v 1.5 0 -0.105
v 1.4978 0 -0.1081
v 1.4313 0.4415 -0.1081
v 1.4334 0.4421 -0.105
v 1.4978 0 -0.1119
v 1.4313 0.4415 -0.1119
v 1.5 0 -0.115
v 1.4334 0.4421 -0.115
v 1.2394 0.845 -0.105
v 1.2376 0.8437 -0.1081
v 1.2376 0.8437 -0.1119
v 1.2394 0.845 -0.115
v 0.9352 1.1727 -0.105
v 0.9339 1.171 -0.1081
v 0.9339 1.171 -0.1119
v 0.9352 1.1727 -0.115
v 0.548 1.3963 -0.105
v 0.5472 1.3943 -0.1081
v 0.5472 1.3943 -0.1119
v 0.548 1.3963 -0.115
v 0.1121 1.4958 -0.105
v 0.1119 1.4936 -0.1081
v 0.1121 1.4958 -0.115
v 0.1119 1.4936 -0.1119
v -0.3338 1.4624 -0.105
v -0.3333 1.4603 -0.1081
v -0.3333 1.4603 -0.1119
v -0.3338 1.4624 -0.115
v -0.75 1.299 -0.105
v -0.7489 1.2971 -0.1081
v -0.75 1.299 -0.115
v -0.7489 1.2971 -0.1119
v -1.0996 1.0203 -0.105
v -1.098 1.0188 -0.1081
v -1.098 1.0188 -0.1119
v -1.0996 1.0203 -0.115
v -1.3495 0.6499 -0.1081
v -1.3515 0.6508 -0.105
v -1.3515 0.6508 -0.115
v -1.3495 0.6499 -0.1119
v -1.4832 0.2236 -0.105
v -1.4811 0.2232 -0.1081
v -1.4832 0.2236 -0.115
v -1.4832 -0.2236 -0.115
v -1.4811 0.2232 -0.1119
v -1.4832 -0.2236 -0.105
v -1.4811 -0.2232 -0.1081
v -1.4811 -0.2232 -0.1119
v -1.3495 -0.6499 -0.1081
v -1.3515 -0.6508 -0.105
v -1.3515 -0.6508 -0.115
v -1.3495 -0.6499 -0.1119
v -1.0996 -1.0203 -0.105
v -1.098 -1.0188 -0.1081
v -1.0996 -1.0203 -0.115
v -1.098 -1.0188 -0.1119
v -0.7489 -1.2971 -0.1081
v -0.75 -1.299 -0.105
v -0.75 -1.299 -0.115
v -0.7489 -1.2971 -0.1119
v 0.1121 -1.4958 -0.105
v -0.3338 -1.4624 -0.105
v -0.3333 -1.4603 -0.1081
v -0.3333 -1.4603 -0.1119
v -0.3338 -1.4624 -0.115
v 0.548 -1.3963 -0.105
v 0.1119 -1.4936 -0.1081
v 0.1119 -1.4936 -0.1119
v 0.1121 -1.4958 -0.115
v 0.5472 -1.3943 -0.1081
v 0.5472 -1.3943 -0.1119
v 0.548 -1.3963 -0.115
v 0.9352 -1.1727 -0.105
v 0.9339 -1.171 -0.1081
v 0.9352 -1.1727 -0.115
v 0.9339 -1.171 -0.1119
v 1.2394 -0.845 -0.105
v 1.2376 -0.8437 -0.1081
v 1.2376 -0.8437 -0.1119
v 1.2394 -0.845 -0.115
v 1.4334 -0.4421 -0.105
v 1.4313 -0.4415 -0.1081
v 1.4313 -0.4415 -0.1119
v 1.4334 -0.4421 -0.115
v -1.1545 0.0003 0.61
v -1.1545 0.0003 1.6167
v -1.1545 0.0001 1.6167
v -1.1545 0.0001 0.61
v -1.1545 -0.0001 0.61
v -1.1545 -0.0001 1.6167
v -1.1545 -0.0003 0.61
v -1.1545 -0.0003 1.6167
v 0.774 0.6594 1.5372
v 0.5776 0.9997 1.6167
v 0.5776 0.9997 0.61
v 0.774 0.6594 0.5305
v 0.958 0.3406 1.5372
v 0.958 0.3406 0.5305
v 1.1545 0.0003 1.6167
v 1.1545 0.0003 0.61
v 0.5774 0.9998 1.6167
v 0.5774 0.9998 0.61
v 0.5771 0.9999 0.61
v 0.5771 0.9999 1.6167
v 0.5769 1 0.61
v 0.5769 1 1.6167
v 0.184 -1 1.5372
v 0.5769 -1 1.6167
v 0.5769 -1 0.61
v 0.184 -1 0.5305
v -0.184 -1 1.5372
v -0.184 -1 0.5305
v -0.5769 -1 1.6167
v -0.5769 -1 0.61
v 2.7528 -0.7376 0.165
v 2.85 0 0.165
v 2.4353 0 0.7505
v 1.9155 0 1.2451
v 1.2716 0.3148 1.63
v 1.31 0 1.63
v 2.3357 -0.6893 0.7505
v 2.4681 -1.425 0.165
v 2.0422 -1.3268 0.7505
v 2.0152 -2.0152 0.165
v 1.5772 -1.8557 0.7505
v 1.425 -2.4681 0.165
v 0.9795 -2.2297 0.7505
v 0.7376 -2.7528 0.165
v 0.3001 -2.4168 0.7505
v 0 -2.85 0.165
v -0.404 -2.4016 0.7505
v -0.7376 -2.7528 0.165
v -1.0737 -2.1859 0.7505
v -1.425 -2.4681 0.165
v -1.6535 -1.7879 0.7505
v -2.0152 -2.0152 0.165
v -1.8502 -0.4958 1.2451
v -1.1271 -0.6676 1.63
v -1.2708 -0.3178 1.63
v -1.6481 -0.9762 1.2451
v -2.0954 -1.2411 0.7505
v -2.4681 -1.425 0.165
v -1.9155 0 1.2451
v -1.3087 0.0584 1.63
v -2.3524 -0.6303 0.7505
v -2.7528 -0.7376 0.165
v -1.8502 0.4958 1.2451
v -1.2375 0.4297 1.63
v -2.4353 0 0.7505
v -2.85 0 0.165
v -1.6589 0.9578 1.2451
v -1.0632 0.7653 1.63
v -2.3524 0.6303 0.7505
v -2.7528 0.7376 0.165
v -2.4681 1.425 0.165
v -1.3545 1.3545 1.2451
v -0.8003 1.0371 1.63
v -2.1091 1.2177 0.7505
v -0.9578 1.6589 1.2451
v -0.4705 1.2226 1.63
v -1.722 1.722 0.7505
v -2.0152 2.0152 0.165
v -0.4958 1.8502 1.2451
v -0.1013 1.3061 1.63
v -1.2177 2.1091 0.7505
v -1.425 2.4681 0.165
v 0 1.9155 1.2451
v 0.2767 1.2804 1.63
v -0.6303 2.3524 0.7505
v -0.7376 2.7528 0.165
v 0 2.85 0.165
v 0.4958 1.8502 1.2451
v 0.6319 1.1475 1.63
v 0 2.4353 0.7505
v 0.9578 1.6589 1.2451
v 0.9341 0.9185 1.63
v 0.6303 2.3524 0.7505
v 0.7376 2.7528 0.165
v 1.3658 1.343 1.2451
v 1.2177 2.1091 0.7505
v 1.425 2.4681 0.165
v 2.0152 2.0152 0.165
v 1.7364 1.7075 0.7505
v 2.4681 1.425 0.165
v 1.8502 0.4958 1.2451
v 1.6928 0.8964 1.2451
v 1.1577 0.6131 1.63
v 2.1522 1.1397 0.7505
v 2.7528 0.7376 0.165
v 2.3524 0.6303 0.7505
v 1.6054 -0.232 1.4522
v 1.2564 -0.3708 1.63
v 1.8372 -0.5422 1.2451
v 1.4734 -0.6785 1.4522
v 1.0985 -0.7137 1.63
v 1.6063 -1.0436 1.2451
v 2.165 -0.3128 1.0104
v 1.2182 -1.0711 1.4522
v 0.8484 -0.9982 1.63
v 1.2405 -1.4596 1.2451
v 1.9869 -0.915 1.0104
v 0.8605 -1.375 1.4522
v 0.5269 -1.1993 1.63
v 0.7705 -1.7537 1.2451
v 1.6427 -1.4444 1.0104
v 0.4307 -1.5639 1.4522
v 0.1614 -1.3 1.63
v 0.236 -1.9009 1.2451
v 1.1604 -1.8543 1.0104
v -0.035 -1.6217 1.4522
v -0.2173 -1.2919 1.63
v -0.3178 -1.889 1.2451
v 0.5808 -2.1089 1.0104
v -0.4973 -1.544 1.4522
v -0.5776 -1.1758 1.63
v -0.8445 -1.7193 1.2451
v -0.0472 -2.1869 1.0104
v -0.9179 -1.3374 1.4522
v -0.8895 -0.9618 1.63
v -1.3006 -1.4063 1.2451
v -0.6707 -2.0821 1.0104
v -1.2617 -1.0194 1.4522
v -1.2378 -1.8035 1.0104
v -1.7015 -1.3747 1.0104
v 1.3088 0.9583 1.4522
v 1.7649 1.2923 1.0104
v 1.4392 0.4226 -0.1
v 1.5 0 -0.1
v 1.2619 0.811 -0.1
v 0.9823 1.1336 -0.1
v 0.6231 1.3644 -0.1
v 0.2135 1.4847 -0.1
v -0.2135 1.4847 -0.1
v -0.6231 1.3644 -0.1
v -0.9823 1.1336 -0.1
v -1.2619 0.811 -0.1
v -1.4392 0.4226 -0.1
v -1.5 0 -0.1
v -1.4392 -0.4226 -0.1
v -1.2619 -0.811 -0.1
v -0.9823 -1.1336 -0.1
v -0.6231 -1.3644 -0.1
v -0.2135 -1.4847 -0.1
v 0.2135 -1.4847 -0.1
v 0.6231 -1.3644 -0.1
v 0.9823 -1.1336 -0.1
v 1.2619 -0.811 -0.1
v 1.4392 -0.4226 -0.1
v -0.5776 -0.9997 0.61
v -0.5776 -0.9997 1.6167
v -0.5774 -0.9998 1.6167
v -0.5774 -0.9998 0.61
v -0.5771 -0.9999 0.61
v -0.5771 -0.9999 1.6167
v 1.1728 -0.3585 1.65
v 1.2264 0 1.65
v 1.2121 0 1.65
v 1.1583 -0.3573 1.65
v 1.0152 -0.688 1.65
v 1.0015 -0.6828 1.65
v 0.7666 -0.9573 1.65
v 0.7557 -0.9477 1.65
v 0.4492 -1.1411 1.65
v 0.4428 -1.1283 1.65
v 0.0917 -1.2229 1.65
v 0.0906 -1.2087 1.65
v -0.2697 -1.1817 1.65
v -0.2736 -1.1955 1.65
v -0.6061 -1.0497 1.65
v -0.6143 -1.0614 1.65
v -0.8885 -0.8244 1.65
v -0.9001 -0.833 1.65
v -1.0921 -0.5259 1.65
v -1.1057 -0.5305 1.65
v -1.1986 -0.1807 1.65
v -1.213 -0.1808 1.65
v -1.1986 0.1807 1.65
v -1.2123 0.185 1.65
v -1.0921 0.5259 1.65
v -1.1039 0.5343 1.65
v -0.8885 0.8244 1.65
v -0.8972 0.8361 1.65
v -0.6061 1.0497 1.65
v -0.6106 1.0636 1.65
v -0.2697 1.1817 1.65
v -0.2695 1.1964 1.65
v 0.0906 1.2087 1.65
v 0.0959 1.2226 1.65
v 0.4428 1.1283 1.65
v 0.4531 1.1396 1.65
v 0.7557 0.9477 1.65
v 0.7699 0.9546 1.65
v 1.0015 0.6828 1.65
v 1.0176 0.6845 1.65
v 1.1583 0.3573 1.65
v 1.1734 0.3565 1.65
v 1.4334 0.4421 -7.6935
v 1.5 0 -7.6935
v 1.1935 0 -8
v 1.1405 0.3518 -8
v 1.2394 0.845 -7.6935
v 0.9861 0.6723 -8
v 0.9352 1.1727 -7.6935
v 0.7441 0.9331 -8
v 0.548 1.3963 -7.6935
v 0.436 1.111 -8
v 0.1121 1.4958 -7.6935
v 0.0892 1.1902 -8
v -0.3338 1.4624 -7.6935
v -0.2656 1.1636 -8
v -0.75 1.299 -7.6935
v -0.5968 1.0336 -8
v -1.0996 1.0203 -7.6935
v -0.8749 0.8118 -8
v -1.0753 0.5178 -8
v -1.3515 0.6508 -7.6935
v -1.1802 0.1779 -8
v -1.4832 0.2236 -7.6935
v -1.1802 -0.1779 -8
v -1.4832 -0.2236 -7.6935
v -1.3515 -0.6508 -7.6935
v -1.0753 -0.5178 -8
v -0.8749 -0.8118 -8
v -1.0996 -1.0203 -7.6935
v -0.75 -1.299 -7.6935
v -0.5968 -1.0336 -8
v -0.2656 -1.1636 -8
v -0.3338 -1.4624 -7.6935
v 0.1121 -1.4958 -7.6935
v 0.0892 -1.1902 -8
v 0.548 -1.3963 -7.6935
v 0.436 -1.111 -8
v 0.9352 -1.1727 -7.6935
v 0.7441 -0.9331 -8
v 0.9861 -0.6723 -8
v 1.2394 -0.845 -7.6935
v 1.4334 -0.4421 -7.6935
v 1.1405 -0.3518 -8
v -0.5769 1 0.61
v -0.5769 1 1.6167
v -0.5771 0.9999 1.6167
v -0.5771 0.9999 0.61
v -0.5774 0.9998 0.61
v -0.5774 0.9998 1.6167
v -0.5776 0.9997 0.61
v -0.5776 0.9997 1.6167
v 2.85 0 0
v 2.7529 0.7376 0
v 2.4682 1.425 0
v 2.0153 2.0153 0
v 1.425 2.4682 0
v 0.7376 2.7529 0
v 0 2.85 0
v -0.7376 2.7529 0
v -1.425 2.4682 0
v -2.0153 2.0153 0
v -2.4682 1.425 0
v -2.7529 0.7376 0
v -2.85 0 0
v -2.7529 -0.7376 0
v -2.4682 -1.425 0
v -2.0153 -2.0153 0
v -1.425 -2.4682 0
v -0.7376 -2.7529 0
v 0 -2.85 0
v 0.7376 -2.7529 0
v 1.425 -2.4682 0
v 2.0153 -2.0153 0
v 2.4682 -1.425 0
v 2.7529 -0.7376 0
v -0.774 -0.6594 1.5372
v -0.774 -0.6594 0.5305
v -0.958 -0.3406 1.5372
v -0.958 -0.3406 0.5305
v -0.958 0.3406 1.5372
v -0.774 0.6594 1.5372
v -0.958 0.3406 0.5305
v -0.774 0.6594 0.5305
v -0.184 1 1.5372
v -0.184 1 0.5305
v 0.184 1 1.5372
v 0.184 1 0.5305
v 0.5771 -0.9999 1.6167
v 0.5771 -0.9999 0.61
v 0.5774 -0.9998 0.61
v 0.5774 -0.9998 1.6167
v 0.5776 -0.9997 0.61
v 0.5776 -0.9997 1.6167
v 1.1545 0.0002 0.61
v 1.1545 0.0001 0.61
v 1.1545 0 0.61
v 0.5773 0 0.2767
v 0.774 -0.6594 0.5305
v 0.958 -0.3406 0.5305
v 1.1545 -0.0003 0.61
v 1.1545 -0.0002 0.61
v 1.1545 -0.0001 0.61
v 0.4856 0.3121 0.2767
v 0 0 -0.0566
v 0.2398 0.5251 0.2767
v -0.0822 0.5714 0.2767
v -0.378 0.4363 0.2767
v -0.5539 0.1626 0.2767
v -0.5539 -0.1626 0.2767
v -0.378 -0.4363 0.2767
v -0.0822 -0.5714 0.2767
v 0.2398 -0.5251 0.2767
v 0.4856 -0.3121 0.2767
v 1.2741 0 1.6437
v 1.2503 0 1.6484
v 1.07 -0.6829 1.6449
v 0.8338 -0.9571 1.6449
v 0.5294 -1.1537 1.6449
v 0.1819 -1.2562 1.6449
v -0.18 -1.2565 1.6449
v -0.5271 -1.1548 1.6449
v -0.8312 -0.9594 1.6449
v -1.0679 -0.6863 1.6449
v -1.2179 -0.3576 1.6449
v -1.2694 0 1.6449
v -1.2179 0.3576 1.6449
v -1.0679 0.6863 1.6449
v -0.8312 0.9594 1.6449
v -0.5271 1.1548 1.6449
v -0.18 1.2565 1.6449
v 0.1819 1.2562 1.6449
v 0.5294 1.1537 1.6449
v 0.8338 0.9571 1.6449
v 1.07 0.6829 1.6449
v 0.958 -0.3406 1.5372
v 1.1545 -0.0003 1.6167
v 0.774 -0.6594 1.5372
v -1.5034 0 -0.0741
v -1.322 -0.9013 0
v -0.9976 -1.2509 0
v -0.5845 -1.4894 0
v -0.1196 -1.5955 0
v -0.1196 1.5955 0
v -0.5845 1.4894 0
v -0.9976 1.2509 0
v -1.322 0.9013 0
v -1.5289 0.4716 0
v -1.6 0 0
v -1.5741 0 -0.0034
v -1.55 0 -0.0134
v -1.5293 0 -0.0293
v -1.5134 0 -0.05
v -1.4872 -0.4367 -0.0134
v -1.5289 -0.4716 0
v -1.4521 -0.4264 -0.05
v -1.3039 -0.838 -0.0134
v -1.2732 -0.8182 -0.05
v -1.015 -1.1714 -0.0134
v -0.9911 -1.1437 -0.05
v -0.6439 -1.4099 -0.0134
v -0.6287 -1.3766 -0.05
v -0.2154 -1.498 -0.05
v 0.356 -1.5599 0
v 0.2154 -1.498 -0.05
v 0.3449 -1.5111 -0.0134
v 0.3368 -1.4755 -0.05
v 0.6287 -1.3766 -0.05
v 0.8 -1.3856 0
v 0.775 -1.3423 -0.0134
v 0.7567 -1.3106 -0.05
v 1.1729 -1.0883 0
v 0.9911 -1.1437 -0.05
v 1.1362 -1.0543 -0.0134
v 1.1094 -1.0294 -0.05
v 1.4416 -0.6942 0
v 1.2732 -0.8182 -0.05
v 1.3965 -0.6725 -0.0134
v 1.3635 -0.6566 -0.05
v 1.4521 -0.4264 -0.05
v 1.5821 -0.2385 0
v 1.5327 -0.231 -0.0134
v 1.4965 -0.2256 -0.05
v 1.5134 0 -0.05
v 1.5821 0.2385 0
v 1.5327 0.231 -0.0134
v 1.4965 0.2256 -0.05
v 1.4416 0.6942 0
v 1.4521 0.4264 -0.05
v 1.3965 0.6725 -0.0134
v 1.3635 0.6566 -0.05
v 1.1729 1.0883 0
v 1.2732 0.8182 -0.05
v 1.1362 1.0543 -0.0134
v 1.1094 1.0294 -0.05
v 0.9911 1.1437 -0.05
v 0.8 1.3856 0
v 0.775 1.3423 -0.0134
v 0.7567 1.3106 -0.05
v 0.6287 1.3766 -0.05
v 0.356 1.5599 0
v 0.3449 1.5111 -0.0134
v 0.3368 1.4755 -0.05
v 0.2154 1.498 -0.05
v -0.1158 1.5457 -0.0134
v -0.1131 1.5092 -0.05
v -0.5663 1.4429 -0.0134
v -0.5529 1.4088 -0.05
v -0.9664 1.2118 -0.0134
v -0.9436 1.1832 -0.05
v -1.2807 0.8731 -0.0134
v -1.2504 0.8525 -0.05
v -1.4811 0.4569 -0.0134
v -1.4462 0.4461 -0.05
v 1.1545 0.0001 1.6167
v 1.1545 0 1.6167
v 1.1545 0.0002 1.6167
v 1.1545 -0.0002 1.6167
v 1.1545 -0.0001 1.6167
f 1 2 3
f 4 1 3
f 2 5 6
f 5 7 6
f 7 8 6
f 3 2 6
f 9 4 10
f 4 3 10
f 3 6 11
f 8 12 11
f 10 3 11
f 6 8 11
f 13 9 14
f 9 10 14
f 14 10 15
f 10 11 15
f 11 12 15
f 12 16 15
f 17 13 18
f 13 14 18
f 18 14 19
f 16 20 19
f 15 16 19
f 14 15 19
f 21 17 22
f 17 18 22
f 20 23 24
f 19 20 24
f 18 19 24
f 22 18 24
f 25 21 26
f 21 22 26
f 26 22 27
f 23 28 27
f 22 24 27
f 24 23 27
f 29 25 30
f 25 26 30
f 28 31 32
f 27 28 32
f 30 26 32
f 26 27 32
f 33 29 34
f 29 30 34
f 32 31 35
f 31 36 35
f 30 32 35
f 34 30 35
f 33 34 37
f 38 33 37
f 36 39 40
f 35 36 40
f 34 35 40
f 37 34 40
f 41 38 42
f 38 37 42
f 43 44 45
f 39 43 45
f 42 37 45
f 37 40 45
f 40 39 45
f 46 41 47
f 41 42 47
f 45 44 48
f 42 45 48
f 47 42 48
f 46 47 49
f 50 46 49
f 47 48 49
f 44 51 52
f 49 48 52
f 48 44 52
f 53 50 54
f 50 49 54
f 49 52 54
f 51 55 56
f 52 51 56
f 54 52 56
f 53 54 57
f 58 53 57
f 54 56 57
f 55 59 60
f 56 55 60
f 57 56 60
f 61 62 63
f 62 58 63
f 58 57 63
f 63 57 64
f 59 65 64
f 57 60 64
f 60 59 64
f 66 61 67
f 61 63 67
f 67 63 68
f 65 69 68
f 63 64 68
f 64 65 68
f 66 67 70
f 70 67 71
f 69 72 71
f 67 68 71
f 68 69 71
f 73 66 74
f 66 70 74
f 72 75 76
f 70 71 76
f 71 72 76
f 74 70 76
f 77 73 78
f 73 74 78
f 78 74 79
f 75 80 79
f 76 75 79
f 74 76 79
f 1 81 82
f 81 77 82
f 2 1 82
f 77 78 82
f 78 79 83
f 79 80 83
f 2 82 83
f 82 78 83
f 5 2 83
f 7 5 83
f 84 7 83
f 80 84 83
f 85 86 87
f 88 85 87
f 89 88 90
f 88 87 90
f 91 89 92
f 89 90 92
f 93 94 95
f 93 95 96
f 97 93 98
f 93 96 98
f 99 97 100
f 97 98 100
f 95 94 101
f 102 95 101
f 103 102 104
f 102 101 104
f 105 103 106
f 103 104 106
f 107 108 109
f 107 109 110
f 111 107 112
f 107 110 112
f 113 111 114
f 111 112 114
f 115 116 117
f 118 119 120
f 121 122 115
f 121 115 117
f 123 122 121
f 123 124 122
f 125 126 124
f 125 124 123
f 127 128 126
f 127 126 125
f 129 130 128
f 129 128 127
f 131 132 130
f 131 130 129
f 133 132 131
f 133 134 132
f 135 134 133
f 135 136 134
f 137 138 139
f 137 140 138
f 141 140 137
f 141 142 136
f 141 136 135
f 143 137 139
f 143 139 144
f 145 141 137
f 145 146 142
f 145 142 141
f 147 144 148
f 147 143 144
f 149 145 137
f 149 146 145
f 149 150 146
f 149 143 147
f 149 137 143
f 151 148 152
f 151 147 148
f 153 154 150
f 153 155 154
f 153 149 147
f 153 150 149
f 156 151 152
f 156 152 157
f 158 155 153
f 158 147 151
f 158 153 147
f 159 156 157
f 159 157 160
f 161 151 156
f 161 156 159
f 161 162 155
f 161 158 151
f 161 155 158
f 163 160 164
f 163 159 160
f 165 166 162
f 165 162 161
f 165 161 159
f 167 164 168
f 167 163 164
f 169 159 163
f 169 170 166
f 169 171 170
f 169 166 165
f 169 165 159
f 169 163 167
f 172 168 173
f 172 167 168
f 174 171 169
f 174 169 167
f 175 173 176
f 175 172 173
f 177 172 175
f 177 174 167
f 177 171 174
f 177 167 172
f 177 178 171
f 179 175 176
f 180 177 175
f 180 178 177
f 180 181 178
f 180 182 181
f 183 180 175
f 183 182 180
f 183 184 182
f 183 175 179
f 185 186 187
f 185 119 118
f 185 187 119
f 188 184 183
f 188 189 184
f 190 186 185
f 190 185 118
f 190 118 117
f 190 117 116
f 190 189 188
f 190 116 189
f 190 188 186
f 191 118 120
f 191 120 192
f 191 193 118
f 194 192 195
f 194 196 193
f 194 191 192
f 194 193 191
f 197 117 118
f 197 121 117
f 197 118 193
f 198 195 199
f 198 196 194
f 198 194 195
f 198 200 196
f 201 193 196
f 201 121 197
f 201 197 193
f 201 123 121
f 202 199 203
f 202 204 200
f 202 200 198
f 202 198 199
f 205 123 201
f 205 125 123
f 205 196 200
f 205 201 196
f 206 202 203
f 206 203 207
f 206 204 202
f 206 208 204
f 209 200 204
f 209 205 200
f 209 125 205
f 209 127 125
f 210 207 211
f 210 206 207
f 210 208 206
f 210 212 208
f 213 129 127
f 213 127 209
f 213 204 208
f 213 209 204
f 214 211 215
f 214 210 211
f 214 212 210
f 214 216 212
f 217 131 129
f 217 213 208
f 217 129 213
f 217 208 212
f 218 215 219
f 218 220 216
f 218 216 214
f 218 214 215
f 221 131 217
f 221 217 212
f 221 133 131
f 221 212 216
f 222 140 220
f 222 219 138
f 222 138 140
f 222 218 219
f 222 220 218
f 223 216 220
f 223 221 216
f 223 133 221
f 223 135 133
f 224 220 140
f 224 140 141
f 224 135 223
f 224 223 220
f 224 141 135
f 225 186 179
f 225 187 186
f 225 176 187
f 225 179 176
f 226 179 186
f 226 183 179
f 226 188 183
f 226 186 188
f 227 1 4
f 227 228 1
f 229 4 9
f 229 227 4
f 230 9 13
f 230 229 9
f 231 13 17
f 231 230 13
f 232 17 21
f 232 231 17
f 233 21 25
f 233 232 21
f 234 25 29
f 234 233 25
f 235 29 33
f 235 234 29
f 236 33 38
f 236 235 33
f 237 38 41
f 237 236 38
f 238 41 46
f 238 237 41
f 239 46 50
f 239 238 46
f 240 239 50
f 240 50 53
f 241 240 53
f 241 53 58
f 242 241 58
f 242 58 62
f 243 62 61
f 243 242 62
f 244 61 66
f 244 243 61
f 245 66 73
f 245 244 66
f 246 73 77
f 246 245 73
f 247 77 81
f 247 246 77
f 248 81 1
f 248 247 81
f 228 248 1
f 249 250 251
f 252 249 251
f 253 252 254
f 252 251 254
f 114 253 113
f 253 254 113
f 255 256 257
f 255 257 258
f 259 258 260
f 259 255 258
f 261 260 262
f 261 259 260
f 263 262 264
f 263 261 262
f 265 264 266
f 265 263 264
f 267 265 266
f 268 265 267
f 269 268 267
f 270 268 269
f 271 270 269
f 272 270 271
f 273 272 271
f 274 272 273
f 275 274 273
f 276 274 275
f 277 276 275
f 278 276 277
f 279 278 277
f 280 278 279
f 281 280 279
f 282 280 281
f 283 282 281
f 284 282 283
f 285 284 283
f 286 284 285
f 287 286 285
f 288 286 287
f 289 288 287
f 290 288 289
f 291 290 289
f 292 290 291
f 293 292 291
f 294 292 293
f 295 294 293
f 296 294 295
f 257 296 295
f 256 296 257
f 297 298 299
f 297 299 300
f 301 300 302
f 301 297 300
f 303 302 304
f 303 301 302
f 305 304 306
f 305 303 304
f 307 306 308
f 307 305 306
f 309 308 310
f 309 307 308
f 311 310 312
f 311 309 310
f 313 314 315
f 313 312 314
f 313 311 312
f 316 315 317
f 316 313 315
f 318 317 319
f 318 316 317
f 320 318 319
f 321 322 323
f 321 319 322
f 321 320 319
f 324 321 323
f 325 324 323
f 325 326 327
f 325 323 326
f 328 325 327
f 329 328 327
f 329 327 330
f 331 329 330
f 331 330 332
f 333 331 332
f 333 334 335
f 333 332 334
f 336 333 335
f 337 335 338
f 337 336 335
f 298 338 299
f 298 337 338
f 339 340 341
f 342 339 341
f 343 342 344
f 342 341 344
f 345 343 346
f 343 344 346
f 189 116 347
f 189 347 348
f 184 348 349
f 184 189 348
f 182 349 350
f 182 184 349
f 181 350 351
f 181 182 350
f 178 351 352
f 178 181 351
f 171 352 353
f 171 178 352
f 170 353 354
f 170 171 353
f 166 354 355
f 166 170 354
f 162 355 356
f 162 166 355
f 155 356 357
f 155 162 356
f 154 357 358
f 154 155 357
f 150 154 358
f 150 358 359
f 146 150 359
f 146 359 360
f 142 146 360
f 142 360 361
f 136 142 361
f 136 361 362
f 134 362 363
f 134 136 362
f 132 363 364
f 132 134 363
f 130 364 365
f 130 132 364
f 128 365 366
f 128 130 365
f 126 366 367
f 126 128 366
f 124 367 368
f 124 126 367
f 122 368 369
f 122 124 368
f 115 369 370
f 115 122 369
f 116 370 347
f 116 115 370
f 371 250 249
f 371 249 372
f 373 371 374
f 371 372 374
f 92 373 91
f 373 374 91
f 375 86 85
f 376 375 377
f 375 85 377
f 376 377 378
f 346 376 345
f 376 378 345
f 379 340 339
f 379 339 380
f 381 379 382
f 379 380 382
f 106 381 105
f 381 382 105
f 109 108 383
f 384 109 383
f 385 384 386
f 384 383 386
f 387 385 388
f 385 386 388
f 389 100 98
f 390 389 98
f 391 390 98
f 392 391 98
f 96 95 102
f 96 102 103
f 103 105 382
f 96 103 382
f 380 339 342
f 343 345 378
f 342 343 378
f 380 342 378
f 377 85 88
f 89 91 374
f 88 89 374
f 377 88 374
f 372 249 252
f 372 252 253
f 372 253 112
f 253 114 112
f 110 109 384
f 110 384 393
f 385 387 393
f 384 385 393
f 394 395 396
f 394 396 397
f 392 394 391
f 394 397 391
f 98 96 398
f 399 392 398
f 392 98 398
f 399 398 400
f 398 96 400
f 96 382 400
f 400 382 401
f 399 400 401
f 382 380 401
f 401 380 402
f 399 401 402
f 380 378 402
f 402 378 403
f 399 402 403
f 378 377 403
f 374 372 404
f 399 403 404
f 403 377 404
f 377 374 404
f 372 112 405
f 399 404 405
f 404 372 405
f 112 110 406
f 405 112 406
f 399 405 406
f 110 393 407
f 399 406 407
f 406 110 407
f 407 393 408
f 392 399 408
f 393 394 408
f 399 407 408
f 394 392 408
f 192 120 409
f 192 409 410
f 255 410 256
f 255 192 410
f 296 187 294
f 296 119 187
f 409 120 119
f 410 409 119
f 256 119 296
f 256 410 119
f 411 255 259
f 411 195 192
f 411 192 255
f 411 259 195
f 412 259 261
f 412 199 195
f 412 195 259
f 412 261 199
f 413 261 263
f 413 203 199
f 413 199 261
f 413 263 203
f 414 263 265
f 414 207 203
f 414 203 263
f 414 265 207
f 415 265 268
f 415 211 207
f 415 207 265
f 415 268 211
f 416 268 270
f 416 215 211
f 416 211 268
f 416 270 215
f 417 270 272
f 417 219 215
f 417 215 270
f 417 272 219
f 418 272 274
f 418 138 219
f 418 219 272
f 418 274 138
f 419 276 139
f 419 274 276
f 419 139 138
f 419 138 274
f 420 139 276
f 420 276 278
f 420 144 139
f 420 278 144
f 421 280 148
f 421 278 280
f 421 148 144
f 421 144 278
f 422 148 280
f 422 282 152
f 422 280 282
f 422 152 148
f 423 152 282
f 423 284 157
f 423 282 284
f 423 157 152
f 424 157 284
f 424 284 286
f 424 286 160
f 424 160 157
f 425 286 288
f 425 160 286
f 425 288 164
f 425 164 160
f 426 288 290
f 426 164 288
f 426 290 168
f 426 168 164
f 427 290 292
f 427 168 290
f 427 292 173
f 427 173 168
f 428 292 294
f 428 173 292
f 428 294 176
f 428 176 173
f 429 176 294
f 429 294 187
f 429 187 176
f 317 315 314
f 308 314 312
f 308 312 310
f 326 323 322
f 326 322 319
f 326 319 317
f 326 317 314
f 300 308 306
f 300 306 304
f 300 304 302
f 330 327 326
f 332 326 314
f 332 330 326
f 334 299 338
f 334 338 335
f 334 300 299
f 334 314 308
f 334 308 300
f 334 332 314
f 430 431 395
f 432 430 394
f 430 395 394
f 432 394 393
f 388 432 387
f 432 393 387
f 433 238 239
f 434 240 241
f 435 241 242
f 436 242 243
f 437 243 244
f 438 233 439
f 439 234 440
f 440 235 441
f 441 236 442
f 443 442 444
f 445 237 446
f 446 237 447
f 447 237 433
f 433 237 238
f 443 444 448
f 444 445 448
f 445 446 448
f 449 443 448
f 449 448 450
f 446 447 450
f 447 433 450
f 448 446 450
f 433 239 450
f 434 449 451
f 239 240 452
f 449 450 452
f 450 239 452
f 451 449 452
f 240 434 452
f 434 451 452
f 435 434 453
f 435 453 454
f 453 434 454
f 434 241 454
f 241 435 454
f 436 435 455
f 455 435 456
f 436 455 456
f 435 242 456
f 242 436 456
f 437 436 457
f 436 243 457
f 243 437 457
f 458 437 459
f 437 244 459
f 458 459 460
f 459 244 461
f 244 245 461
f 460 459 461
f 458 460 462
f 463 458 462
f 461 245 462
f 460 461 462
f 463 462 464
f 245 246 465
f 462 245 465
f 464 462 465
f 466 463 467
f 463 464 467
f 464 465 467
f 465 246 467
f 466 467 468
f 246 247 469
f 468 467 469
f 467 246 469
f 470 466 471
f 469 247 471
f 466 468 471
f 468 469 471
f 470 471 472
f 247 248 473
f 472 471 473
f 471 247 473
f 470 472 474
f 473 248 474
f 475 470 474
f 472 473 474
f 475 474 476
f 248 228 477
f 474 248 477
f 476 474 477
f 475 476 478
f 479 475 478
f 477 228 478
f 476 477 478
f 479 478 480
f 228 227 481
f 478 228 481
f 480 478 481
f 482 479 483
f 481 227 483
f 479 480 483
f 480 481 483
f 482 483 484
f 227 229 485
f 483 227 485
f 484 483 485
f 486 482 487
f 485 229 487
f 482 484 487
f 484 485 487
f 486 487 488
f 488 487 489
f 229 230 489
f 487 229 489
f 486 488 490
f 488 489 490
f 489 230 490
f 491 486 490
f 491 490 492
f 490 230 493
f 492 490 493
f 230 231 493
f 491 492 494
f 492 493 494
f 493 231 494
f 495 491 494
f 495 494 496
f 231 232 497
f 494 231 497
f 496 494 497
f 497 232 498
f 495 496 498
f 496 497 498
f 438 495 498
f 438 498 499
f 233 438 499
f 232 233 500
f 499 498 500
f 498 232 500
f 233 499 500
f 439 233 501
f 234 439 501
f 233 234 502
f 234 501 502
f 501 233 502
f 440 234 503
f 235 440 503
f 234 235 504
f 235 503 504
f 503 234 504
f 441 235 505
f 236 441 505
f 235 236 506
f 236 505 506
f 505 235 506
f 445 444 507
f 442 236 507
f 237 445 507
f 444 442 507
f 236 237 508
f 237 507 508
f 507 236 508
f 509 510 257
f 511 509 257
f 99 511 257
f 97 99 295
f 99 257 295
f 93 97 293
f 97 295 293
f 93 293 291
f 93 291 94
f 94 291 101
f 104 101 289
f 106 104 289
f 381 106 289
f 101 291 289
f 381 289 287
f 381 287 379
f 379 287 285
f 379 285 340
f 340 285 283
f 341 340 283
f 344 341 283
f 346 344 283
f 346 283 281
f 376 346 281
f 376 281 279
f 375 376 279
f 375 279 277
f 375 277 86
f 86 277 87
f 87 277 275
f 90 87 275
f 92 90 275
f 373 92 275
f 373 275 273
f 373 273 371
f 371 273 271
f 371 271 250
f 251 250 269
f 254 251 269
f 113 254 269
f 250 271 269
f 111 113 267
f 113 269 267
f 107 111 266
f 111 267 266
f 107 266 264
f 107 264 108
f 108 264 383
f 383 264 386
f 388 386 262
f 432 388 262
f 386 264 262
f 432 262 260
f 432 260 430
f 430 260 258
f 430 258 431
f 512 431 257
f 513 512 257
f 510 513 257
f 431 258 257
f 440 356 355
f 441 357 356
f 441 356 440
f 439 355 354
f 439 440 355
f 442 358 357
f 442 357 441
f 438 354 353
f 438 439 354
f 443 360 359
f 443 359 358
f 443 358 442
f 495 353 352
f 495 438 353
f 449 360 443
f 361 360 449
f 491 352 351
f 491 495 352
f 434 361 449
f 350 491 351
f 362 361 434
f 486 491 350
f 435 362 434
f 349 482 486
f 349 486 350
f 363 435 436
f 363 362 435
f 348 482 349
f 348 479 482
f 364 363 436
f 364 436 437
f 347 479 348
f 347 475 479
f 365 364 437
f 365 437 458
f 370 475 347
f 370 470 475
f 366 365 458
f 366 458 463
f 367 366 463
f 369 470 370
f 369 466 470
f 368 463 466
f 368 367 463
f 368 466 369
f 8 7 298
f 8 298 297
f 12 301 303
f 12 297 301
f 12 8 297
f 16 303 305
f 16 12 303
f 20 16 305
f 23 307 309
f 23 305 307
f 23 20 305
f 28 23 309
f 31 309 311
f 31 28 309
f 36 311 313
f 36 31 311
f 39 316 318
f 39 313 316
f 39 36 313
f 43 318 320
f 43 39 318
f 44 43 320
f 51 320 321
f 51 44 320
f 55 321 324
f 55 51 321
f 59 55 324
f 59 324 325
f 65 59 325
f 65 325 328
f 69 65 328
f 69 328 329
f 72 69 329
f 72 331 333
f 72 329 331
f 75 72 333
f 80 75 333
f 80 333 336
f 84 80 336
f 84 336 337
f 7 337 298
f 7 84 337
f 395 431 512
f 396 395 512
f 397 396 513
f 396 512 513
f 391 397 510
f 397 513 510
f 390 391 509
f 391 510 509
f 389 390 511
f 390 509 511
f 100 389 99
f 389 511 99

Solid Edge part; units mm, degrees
sketch "Sketch1" plane through (0, 0, 0) normal (0, -1, 0) x (1, 0, 0)
  line L0 (0, -8) -> (1.5, -8)
  line L1 (1.5, -8) -> (1.5, -0.115)
  arc A0 (1.5, -0.105) -> (1.5, -0.115) centre (1.5038, -0.11) ccw
  line L2 (1.5, -0.105) -> (1.5, 0)
  line L3 (1.5, 0) -> (2.85, 0)
  line L4 (2.85, 0) -> (2.85, 0.165)
  arc A1 (1.27, 1.65) -> (2.85, 0.165) centre (-0.3628, -1.6703) cw
  line L5 (0, 1.65) -> (1.27, 1.65)
  dimension "D1" = 7.885
  dimension "D2" = 1.5
  dimension "D3" = 1.27
  dimension "D4" = 2.85
  dimension "D5" = 0.165
  dimension "D6" = 1.65
  dimension "D7" = 3.7
  dimension "D8" = 8
  dimension "D9" = 0.01
  dimension "D10" = 0.0025
revolve "RevolvedProtrusion1" add sketch "Sketch1" angle 360 about axis through (0, 0, 5) along (0, 0, -1)
sketch "Sketch2" plane through (0, 0, 0) normal (0, -1, 0) x (1, 0, 0)
  line L0 (0, -0.0566) -> (1.1545, 0.61)
  line L1 (1.1545, 0.61) -> (1.1545, 1.65)
  line L2 (1.1545, 1.65) -> (0, 1.65)
  dimension "D1" = 1.1545
  dimension "D2" = 1.04
revolve "RevolvedCutout1" cut sketch "Sketch2" angle 360 about axis through (0, 0, 5.3) along (0, 0, -1)
sketch "Sketch3" plane through (0, 0, 0) normal (0, 0, -1) x (0, 1, 0)
  arc A0 (-1, 0.577) -> (-1, -0.577) centre (0, 0) ccw
  line L0 (-1, 0.577) -> (-1, -0.577)
  dimension "D1" = 1
extrude "Protrusion1" add sketch "Sketch3" against normal blind 1.65
pattern_circular "Pattern1" count 6 over 360 about axis through (0, 0, 0) along (0, 0, -1) of "Protrusion1"
fillet "Round_1" radius 0.185 1 edges at (-1.27, 0, 1.65)
sketch "Sketch4" plane through (0, 0, 0) normal (0, -1, 0) x (1, 0, 0)
  line L0 (0, 0.9501) -> (1.2122, 1.65)
  line L1 (1.2122, 1.65) -> (0, 1.65)
  dimension "D1" = 1.2122
revolve "RevolvedCutout2" cut sketch "Sketch4" angle 360 about axis through (0, 0, 5.3) along (0, 0, -1)
sketch "Sketch5" plane through (0, 0, 0) normal (0, -1, 0) x (1, 0, 0)
  line L0 (-1.5, 0) -> (-1.5, -0.1)
  line L1 (-1.6, 0) -> (-1.5, 0)
  arc A0 (-1.6, 0) -> (-1.5, -0.1) centre (-1.6, -0.1) cw
  dimension "D1" = 1.5
  dimension "D2" = 0.1
revolve "RevolvedProtrusion2" add sketch "Sketch5" angle 360 about axis through (0, 0, -0.5) along (0, 0, 1)
cosmetic_thread "Thread1" size "M3"
chamfer "Chamfer1" distance 0.3065 angle 45 1 edges at (-1.5, 0, -8)
properties material "Stahl"
